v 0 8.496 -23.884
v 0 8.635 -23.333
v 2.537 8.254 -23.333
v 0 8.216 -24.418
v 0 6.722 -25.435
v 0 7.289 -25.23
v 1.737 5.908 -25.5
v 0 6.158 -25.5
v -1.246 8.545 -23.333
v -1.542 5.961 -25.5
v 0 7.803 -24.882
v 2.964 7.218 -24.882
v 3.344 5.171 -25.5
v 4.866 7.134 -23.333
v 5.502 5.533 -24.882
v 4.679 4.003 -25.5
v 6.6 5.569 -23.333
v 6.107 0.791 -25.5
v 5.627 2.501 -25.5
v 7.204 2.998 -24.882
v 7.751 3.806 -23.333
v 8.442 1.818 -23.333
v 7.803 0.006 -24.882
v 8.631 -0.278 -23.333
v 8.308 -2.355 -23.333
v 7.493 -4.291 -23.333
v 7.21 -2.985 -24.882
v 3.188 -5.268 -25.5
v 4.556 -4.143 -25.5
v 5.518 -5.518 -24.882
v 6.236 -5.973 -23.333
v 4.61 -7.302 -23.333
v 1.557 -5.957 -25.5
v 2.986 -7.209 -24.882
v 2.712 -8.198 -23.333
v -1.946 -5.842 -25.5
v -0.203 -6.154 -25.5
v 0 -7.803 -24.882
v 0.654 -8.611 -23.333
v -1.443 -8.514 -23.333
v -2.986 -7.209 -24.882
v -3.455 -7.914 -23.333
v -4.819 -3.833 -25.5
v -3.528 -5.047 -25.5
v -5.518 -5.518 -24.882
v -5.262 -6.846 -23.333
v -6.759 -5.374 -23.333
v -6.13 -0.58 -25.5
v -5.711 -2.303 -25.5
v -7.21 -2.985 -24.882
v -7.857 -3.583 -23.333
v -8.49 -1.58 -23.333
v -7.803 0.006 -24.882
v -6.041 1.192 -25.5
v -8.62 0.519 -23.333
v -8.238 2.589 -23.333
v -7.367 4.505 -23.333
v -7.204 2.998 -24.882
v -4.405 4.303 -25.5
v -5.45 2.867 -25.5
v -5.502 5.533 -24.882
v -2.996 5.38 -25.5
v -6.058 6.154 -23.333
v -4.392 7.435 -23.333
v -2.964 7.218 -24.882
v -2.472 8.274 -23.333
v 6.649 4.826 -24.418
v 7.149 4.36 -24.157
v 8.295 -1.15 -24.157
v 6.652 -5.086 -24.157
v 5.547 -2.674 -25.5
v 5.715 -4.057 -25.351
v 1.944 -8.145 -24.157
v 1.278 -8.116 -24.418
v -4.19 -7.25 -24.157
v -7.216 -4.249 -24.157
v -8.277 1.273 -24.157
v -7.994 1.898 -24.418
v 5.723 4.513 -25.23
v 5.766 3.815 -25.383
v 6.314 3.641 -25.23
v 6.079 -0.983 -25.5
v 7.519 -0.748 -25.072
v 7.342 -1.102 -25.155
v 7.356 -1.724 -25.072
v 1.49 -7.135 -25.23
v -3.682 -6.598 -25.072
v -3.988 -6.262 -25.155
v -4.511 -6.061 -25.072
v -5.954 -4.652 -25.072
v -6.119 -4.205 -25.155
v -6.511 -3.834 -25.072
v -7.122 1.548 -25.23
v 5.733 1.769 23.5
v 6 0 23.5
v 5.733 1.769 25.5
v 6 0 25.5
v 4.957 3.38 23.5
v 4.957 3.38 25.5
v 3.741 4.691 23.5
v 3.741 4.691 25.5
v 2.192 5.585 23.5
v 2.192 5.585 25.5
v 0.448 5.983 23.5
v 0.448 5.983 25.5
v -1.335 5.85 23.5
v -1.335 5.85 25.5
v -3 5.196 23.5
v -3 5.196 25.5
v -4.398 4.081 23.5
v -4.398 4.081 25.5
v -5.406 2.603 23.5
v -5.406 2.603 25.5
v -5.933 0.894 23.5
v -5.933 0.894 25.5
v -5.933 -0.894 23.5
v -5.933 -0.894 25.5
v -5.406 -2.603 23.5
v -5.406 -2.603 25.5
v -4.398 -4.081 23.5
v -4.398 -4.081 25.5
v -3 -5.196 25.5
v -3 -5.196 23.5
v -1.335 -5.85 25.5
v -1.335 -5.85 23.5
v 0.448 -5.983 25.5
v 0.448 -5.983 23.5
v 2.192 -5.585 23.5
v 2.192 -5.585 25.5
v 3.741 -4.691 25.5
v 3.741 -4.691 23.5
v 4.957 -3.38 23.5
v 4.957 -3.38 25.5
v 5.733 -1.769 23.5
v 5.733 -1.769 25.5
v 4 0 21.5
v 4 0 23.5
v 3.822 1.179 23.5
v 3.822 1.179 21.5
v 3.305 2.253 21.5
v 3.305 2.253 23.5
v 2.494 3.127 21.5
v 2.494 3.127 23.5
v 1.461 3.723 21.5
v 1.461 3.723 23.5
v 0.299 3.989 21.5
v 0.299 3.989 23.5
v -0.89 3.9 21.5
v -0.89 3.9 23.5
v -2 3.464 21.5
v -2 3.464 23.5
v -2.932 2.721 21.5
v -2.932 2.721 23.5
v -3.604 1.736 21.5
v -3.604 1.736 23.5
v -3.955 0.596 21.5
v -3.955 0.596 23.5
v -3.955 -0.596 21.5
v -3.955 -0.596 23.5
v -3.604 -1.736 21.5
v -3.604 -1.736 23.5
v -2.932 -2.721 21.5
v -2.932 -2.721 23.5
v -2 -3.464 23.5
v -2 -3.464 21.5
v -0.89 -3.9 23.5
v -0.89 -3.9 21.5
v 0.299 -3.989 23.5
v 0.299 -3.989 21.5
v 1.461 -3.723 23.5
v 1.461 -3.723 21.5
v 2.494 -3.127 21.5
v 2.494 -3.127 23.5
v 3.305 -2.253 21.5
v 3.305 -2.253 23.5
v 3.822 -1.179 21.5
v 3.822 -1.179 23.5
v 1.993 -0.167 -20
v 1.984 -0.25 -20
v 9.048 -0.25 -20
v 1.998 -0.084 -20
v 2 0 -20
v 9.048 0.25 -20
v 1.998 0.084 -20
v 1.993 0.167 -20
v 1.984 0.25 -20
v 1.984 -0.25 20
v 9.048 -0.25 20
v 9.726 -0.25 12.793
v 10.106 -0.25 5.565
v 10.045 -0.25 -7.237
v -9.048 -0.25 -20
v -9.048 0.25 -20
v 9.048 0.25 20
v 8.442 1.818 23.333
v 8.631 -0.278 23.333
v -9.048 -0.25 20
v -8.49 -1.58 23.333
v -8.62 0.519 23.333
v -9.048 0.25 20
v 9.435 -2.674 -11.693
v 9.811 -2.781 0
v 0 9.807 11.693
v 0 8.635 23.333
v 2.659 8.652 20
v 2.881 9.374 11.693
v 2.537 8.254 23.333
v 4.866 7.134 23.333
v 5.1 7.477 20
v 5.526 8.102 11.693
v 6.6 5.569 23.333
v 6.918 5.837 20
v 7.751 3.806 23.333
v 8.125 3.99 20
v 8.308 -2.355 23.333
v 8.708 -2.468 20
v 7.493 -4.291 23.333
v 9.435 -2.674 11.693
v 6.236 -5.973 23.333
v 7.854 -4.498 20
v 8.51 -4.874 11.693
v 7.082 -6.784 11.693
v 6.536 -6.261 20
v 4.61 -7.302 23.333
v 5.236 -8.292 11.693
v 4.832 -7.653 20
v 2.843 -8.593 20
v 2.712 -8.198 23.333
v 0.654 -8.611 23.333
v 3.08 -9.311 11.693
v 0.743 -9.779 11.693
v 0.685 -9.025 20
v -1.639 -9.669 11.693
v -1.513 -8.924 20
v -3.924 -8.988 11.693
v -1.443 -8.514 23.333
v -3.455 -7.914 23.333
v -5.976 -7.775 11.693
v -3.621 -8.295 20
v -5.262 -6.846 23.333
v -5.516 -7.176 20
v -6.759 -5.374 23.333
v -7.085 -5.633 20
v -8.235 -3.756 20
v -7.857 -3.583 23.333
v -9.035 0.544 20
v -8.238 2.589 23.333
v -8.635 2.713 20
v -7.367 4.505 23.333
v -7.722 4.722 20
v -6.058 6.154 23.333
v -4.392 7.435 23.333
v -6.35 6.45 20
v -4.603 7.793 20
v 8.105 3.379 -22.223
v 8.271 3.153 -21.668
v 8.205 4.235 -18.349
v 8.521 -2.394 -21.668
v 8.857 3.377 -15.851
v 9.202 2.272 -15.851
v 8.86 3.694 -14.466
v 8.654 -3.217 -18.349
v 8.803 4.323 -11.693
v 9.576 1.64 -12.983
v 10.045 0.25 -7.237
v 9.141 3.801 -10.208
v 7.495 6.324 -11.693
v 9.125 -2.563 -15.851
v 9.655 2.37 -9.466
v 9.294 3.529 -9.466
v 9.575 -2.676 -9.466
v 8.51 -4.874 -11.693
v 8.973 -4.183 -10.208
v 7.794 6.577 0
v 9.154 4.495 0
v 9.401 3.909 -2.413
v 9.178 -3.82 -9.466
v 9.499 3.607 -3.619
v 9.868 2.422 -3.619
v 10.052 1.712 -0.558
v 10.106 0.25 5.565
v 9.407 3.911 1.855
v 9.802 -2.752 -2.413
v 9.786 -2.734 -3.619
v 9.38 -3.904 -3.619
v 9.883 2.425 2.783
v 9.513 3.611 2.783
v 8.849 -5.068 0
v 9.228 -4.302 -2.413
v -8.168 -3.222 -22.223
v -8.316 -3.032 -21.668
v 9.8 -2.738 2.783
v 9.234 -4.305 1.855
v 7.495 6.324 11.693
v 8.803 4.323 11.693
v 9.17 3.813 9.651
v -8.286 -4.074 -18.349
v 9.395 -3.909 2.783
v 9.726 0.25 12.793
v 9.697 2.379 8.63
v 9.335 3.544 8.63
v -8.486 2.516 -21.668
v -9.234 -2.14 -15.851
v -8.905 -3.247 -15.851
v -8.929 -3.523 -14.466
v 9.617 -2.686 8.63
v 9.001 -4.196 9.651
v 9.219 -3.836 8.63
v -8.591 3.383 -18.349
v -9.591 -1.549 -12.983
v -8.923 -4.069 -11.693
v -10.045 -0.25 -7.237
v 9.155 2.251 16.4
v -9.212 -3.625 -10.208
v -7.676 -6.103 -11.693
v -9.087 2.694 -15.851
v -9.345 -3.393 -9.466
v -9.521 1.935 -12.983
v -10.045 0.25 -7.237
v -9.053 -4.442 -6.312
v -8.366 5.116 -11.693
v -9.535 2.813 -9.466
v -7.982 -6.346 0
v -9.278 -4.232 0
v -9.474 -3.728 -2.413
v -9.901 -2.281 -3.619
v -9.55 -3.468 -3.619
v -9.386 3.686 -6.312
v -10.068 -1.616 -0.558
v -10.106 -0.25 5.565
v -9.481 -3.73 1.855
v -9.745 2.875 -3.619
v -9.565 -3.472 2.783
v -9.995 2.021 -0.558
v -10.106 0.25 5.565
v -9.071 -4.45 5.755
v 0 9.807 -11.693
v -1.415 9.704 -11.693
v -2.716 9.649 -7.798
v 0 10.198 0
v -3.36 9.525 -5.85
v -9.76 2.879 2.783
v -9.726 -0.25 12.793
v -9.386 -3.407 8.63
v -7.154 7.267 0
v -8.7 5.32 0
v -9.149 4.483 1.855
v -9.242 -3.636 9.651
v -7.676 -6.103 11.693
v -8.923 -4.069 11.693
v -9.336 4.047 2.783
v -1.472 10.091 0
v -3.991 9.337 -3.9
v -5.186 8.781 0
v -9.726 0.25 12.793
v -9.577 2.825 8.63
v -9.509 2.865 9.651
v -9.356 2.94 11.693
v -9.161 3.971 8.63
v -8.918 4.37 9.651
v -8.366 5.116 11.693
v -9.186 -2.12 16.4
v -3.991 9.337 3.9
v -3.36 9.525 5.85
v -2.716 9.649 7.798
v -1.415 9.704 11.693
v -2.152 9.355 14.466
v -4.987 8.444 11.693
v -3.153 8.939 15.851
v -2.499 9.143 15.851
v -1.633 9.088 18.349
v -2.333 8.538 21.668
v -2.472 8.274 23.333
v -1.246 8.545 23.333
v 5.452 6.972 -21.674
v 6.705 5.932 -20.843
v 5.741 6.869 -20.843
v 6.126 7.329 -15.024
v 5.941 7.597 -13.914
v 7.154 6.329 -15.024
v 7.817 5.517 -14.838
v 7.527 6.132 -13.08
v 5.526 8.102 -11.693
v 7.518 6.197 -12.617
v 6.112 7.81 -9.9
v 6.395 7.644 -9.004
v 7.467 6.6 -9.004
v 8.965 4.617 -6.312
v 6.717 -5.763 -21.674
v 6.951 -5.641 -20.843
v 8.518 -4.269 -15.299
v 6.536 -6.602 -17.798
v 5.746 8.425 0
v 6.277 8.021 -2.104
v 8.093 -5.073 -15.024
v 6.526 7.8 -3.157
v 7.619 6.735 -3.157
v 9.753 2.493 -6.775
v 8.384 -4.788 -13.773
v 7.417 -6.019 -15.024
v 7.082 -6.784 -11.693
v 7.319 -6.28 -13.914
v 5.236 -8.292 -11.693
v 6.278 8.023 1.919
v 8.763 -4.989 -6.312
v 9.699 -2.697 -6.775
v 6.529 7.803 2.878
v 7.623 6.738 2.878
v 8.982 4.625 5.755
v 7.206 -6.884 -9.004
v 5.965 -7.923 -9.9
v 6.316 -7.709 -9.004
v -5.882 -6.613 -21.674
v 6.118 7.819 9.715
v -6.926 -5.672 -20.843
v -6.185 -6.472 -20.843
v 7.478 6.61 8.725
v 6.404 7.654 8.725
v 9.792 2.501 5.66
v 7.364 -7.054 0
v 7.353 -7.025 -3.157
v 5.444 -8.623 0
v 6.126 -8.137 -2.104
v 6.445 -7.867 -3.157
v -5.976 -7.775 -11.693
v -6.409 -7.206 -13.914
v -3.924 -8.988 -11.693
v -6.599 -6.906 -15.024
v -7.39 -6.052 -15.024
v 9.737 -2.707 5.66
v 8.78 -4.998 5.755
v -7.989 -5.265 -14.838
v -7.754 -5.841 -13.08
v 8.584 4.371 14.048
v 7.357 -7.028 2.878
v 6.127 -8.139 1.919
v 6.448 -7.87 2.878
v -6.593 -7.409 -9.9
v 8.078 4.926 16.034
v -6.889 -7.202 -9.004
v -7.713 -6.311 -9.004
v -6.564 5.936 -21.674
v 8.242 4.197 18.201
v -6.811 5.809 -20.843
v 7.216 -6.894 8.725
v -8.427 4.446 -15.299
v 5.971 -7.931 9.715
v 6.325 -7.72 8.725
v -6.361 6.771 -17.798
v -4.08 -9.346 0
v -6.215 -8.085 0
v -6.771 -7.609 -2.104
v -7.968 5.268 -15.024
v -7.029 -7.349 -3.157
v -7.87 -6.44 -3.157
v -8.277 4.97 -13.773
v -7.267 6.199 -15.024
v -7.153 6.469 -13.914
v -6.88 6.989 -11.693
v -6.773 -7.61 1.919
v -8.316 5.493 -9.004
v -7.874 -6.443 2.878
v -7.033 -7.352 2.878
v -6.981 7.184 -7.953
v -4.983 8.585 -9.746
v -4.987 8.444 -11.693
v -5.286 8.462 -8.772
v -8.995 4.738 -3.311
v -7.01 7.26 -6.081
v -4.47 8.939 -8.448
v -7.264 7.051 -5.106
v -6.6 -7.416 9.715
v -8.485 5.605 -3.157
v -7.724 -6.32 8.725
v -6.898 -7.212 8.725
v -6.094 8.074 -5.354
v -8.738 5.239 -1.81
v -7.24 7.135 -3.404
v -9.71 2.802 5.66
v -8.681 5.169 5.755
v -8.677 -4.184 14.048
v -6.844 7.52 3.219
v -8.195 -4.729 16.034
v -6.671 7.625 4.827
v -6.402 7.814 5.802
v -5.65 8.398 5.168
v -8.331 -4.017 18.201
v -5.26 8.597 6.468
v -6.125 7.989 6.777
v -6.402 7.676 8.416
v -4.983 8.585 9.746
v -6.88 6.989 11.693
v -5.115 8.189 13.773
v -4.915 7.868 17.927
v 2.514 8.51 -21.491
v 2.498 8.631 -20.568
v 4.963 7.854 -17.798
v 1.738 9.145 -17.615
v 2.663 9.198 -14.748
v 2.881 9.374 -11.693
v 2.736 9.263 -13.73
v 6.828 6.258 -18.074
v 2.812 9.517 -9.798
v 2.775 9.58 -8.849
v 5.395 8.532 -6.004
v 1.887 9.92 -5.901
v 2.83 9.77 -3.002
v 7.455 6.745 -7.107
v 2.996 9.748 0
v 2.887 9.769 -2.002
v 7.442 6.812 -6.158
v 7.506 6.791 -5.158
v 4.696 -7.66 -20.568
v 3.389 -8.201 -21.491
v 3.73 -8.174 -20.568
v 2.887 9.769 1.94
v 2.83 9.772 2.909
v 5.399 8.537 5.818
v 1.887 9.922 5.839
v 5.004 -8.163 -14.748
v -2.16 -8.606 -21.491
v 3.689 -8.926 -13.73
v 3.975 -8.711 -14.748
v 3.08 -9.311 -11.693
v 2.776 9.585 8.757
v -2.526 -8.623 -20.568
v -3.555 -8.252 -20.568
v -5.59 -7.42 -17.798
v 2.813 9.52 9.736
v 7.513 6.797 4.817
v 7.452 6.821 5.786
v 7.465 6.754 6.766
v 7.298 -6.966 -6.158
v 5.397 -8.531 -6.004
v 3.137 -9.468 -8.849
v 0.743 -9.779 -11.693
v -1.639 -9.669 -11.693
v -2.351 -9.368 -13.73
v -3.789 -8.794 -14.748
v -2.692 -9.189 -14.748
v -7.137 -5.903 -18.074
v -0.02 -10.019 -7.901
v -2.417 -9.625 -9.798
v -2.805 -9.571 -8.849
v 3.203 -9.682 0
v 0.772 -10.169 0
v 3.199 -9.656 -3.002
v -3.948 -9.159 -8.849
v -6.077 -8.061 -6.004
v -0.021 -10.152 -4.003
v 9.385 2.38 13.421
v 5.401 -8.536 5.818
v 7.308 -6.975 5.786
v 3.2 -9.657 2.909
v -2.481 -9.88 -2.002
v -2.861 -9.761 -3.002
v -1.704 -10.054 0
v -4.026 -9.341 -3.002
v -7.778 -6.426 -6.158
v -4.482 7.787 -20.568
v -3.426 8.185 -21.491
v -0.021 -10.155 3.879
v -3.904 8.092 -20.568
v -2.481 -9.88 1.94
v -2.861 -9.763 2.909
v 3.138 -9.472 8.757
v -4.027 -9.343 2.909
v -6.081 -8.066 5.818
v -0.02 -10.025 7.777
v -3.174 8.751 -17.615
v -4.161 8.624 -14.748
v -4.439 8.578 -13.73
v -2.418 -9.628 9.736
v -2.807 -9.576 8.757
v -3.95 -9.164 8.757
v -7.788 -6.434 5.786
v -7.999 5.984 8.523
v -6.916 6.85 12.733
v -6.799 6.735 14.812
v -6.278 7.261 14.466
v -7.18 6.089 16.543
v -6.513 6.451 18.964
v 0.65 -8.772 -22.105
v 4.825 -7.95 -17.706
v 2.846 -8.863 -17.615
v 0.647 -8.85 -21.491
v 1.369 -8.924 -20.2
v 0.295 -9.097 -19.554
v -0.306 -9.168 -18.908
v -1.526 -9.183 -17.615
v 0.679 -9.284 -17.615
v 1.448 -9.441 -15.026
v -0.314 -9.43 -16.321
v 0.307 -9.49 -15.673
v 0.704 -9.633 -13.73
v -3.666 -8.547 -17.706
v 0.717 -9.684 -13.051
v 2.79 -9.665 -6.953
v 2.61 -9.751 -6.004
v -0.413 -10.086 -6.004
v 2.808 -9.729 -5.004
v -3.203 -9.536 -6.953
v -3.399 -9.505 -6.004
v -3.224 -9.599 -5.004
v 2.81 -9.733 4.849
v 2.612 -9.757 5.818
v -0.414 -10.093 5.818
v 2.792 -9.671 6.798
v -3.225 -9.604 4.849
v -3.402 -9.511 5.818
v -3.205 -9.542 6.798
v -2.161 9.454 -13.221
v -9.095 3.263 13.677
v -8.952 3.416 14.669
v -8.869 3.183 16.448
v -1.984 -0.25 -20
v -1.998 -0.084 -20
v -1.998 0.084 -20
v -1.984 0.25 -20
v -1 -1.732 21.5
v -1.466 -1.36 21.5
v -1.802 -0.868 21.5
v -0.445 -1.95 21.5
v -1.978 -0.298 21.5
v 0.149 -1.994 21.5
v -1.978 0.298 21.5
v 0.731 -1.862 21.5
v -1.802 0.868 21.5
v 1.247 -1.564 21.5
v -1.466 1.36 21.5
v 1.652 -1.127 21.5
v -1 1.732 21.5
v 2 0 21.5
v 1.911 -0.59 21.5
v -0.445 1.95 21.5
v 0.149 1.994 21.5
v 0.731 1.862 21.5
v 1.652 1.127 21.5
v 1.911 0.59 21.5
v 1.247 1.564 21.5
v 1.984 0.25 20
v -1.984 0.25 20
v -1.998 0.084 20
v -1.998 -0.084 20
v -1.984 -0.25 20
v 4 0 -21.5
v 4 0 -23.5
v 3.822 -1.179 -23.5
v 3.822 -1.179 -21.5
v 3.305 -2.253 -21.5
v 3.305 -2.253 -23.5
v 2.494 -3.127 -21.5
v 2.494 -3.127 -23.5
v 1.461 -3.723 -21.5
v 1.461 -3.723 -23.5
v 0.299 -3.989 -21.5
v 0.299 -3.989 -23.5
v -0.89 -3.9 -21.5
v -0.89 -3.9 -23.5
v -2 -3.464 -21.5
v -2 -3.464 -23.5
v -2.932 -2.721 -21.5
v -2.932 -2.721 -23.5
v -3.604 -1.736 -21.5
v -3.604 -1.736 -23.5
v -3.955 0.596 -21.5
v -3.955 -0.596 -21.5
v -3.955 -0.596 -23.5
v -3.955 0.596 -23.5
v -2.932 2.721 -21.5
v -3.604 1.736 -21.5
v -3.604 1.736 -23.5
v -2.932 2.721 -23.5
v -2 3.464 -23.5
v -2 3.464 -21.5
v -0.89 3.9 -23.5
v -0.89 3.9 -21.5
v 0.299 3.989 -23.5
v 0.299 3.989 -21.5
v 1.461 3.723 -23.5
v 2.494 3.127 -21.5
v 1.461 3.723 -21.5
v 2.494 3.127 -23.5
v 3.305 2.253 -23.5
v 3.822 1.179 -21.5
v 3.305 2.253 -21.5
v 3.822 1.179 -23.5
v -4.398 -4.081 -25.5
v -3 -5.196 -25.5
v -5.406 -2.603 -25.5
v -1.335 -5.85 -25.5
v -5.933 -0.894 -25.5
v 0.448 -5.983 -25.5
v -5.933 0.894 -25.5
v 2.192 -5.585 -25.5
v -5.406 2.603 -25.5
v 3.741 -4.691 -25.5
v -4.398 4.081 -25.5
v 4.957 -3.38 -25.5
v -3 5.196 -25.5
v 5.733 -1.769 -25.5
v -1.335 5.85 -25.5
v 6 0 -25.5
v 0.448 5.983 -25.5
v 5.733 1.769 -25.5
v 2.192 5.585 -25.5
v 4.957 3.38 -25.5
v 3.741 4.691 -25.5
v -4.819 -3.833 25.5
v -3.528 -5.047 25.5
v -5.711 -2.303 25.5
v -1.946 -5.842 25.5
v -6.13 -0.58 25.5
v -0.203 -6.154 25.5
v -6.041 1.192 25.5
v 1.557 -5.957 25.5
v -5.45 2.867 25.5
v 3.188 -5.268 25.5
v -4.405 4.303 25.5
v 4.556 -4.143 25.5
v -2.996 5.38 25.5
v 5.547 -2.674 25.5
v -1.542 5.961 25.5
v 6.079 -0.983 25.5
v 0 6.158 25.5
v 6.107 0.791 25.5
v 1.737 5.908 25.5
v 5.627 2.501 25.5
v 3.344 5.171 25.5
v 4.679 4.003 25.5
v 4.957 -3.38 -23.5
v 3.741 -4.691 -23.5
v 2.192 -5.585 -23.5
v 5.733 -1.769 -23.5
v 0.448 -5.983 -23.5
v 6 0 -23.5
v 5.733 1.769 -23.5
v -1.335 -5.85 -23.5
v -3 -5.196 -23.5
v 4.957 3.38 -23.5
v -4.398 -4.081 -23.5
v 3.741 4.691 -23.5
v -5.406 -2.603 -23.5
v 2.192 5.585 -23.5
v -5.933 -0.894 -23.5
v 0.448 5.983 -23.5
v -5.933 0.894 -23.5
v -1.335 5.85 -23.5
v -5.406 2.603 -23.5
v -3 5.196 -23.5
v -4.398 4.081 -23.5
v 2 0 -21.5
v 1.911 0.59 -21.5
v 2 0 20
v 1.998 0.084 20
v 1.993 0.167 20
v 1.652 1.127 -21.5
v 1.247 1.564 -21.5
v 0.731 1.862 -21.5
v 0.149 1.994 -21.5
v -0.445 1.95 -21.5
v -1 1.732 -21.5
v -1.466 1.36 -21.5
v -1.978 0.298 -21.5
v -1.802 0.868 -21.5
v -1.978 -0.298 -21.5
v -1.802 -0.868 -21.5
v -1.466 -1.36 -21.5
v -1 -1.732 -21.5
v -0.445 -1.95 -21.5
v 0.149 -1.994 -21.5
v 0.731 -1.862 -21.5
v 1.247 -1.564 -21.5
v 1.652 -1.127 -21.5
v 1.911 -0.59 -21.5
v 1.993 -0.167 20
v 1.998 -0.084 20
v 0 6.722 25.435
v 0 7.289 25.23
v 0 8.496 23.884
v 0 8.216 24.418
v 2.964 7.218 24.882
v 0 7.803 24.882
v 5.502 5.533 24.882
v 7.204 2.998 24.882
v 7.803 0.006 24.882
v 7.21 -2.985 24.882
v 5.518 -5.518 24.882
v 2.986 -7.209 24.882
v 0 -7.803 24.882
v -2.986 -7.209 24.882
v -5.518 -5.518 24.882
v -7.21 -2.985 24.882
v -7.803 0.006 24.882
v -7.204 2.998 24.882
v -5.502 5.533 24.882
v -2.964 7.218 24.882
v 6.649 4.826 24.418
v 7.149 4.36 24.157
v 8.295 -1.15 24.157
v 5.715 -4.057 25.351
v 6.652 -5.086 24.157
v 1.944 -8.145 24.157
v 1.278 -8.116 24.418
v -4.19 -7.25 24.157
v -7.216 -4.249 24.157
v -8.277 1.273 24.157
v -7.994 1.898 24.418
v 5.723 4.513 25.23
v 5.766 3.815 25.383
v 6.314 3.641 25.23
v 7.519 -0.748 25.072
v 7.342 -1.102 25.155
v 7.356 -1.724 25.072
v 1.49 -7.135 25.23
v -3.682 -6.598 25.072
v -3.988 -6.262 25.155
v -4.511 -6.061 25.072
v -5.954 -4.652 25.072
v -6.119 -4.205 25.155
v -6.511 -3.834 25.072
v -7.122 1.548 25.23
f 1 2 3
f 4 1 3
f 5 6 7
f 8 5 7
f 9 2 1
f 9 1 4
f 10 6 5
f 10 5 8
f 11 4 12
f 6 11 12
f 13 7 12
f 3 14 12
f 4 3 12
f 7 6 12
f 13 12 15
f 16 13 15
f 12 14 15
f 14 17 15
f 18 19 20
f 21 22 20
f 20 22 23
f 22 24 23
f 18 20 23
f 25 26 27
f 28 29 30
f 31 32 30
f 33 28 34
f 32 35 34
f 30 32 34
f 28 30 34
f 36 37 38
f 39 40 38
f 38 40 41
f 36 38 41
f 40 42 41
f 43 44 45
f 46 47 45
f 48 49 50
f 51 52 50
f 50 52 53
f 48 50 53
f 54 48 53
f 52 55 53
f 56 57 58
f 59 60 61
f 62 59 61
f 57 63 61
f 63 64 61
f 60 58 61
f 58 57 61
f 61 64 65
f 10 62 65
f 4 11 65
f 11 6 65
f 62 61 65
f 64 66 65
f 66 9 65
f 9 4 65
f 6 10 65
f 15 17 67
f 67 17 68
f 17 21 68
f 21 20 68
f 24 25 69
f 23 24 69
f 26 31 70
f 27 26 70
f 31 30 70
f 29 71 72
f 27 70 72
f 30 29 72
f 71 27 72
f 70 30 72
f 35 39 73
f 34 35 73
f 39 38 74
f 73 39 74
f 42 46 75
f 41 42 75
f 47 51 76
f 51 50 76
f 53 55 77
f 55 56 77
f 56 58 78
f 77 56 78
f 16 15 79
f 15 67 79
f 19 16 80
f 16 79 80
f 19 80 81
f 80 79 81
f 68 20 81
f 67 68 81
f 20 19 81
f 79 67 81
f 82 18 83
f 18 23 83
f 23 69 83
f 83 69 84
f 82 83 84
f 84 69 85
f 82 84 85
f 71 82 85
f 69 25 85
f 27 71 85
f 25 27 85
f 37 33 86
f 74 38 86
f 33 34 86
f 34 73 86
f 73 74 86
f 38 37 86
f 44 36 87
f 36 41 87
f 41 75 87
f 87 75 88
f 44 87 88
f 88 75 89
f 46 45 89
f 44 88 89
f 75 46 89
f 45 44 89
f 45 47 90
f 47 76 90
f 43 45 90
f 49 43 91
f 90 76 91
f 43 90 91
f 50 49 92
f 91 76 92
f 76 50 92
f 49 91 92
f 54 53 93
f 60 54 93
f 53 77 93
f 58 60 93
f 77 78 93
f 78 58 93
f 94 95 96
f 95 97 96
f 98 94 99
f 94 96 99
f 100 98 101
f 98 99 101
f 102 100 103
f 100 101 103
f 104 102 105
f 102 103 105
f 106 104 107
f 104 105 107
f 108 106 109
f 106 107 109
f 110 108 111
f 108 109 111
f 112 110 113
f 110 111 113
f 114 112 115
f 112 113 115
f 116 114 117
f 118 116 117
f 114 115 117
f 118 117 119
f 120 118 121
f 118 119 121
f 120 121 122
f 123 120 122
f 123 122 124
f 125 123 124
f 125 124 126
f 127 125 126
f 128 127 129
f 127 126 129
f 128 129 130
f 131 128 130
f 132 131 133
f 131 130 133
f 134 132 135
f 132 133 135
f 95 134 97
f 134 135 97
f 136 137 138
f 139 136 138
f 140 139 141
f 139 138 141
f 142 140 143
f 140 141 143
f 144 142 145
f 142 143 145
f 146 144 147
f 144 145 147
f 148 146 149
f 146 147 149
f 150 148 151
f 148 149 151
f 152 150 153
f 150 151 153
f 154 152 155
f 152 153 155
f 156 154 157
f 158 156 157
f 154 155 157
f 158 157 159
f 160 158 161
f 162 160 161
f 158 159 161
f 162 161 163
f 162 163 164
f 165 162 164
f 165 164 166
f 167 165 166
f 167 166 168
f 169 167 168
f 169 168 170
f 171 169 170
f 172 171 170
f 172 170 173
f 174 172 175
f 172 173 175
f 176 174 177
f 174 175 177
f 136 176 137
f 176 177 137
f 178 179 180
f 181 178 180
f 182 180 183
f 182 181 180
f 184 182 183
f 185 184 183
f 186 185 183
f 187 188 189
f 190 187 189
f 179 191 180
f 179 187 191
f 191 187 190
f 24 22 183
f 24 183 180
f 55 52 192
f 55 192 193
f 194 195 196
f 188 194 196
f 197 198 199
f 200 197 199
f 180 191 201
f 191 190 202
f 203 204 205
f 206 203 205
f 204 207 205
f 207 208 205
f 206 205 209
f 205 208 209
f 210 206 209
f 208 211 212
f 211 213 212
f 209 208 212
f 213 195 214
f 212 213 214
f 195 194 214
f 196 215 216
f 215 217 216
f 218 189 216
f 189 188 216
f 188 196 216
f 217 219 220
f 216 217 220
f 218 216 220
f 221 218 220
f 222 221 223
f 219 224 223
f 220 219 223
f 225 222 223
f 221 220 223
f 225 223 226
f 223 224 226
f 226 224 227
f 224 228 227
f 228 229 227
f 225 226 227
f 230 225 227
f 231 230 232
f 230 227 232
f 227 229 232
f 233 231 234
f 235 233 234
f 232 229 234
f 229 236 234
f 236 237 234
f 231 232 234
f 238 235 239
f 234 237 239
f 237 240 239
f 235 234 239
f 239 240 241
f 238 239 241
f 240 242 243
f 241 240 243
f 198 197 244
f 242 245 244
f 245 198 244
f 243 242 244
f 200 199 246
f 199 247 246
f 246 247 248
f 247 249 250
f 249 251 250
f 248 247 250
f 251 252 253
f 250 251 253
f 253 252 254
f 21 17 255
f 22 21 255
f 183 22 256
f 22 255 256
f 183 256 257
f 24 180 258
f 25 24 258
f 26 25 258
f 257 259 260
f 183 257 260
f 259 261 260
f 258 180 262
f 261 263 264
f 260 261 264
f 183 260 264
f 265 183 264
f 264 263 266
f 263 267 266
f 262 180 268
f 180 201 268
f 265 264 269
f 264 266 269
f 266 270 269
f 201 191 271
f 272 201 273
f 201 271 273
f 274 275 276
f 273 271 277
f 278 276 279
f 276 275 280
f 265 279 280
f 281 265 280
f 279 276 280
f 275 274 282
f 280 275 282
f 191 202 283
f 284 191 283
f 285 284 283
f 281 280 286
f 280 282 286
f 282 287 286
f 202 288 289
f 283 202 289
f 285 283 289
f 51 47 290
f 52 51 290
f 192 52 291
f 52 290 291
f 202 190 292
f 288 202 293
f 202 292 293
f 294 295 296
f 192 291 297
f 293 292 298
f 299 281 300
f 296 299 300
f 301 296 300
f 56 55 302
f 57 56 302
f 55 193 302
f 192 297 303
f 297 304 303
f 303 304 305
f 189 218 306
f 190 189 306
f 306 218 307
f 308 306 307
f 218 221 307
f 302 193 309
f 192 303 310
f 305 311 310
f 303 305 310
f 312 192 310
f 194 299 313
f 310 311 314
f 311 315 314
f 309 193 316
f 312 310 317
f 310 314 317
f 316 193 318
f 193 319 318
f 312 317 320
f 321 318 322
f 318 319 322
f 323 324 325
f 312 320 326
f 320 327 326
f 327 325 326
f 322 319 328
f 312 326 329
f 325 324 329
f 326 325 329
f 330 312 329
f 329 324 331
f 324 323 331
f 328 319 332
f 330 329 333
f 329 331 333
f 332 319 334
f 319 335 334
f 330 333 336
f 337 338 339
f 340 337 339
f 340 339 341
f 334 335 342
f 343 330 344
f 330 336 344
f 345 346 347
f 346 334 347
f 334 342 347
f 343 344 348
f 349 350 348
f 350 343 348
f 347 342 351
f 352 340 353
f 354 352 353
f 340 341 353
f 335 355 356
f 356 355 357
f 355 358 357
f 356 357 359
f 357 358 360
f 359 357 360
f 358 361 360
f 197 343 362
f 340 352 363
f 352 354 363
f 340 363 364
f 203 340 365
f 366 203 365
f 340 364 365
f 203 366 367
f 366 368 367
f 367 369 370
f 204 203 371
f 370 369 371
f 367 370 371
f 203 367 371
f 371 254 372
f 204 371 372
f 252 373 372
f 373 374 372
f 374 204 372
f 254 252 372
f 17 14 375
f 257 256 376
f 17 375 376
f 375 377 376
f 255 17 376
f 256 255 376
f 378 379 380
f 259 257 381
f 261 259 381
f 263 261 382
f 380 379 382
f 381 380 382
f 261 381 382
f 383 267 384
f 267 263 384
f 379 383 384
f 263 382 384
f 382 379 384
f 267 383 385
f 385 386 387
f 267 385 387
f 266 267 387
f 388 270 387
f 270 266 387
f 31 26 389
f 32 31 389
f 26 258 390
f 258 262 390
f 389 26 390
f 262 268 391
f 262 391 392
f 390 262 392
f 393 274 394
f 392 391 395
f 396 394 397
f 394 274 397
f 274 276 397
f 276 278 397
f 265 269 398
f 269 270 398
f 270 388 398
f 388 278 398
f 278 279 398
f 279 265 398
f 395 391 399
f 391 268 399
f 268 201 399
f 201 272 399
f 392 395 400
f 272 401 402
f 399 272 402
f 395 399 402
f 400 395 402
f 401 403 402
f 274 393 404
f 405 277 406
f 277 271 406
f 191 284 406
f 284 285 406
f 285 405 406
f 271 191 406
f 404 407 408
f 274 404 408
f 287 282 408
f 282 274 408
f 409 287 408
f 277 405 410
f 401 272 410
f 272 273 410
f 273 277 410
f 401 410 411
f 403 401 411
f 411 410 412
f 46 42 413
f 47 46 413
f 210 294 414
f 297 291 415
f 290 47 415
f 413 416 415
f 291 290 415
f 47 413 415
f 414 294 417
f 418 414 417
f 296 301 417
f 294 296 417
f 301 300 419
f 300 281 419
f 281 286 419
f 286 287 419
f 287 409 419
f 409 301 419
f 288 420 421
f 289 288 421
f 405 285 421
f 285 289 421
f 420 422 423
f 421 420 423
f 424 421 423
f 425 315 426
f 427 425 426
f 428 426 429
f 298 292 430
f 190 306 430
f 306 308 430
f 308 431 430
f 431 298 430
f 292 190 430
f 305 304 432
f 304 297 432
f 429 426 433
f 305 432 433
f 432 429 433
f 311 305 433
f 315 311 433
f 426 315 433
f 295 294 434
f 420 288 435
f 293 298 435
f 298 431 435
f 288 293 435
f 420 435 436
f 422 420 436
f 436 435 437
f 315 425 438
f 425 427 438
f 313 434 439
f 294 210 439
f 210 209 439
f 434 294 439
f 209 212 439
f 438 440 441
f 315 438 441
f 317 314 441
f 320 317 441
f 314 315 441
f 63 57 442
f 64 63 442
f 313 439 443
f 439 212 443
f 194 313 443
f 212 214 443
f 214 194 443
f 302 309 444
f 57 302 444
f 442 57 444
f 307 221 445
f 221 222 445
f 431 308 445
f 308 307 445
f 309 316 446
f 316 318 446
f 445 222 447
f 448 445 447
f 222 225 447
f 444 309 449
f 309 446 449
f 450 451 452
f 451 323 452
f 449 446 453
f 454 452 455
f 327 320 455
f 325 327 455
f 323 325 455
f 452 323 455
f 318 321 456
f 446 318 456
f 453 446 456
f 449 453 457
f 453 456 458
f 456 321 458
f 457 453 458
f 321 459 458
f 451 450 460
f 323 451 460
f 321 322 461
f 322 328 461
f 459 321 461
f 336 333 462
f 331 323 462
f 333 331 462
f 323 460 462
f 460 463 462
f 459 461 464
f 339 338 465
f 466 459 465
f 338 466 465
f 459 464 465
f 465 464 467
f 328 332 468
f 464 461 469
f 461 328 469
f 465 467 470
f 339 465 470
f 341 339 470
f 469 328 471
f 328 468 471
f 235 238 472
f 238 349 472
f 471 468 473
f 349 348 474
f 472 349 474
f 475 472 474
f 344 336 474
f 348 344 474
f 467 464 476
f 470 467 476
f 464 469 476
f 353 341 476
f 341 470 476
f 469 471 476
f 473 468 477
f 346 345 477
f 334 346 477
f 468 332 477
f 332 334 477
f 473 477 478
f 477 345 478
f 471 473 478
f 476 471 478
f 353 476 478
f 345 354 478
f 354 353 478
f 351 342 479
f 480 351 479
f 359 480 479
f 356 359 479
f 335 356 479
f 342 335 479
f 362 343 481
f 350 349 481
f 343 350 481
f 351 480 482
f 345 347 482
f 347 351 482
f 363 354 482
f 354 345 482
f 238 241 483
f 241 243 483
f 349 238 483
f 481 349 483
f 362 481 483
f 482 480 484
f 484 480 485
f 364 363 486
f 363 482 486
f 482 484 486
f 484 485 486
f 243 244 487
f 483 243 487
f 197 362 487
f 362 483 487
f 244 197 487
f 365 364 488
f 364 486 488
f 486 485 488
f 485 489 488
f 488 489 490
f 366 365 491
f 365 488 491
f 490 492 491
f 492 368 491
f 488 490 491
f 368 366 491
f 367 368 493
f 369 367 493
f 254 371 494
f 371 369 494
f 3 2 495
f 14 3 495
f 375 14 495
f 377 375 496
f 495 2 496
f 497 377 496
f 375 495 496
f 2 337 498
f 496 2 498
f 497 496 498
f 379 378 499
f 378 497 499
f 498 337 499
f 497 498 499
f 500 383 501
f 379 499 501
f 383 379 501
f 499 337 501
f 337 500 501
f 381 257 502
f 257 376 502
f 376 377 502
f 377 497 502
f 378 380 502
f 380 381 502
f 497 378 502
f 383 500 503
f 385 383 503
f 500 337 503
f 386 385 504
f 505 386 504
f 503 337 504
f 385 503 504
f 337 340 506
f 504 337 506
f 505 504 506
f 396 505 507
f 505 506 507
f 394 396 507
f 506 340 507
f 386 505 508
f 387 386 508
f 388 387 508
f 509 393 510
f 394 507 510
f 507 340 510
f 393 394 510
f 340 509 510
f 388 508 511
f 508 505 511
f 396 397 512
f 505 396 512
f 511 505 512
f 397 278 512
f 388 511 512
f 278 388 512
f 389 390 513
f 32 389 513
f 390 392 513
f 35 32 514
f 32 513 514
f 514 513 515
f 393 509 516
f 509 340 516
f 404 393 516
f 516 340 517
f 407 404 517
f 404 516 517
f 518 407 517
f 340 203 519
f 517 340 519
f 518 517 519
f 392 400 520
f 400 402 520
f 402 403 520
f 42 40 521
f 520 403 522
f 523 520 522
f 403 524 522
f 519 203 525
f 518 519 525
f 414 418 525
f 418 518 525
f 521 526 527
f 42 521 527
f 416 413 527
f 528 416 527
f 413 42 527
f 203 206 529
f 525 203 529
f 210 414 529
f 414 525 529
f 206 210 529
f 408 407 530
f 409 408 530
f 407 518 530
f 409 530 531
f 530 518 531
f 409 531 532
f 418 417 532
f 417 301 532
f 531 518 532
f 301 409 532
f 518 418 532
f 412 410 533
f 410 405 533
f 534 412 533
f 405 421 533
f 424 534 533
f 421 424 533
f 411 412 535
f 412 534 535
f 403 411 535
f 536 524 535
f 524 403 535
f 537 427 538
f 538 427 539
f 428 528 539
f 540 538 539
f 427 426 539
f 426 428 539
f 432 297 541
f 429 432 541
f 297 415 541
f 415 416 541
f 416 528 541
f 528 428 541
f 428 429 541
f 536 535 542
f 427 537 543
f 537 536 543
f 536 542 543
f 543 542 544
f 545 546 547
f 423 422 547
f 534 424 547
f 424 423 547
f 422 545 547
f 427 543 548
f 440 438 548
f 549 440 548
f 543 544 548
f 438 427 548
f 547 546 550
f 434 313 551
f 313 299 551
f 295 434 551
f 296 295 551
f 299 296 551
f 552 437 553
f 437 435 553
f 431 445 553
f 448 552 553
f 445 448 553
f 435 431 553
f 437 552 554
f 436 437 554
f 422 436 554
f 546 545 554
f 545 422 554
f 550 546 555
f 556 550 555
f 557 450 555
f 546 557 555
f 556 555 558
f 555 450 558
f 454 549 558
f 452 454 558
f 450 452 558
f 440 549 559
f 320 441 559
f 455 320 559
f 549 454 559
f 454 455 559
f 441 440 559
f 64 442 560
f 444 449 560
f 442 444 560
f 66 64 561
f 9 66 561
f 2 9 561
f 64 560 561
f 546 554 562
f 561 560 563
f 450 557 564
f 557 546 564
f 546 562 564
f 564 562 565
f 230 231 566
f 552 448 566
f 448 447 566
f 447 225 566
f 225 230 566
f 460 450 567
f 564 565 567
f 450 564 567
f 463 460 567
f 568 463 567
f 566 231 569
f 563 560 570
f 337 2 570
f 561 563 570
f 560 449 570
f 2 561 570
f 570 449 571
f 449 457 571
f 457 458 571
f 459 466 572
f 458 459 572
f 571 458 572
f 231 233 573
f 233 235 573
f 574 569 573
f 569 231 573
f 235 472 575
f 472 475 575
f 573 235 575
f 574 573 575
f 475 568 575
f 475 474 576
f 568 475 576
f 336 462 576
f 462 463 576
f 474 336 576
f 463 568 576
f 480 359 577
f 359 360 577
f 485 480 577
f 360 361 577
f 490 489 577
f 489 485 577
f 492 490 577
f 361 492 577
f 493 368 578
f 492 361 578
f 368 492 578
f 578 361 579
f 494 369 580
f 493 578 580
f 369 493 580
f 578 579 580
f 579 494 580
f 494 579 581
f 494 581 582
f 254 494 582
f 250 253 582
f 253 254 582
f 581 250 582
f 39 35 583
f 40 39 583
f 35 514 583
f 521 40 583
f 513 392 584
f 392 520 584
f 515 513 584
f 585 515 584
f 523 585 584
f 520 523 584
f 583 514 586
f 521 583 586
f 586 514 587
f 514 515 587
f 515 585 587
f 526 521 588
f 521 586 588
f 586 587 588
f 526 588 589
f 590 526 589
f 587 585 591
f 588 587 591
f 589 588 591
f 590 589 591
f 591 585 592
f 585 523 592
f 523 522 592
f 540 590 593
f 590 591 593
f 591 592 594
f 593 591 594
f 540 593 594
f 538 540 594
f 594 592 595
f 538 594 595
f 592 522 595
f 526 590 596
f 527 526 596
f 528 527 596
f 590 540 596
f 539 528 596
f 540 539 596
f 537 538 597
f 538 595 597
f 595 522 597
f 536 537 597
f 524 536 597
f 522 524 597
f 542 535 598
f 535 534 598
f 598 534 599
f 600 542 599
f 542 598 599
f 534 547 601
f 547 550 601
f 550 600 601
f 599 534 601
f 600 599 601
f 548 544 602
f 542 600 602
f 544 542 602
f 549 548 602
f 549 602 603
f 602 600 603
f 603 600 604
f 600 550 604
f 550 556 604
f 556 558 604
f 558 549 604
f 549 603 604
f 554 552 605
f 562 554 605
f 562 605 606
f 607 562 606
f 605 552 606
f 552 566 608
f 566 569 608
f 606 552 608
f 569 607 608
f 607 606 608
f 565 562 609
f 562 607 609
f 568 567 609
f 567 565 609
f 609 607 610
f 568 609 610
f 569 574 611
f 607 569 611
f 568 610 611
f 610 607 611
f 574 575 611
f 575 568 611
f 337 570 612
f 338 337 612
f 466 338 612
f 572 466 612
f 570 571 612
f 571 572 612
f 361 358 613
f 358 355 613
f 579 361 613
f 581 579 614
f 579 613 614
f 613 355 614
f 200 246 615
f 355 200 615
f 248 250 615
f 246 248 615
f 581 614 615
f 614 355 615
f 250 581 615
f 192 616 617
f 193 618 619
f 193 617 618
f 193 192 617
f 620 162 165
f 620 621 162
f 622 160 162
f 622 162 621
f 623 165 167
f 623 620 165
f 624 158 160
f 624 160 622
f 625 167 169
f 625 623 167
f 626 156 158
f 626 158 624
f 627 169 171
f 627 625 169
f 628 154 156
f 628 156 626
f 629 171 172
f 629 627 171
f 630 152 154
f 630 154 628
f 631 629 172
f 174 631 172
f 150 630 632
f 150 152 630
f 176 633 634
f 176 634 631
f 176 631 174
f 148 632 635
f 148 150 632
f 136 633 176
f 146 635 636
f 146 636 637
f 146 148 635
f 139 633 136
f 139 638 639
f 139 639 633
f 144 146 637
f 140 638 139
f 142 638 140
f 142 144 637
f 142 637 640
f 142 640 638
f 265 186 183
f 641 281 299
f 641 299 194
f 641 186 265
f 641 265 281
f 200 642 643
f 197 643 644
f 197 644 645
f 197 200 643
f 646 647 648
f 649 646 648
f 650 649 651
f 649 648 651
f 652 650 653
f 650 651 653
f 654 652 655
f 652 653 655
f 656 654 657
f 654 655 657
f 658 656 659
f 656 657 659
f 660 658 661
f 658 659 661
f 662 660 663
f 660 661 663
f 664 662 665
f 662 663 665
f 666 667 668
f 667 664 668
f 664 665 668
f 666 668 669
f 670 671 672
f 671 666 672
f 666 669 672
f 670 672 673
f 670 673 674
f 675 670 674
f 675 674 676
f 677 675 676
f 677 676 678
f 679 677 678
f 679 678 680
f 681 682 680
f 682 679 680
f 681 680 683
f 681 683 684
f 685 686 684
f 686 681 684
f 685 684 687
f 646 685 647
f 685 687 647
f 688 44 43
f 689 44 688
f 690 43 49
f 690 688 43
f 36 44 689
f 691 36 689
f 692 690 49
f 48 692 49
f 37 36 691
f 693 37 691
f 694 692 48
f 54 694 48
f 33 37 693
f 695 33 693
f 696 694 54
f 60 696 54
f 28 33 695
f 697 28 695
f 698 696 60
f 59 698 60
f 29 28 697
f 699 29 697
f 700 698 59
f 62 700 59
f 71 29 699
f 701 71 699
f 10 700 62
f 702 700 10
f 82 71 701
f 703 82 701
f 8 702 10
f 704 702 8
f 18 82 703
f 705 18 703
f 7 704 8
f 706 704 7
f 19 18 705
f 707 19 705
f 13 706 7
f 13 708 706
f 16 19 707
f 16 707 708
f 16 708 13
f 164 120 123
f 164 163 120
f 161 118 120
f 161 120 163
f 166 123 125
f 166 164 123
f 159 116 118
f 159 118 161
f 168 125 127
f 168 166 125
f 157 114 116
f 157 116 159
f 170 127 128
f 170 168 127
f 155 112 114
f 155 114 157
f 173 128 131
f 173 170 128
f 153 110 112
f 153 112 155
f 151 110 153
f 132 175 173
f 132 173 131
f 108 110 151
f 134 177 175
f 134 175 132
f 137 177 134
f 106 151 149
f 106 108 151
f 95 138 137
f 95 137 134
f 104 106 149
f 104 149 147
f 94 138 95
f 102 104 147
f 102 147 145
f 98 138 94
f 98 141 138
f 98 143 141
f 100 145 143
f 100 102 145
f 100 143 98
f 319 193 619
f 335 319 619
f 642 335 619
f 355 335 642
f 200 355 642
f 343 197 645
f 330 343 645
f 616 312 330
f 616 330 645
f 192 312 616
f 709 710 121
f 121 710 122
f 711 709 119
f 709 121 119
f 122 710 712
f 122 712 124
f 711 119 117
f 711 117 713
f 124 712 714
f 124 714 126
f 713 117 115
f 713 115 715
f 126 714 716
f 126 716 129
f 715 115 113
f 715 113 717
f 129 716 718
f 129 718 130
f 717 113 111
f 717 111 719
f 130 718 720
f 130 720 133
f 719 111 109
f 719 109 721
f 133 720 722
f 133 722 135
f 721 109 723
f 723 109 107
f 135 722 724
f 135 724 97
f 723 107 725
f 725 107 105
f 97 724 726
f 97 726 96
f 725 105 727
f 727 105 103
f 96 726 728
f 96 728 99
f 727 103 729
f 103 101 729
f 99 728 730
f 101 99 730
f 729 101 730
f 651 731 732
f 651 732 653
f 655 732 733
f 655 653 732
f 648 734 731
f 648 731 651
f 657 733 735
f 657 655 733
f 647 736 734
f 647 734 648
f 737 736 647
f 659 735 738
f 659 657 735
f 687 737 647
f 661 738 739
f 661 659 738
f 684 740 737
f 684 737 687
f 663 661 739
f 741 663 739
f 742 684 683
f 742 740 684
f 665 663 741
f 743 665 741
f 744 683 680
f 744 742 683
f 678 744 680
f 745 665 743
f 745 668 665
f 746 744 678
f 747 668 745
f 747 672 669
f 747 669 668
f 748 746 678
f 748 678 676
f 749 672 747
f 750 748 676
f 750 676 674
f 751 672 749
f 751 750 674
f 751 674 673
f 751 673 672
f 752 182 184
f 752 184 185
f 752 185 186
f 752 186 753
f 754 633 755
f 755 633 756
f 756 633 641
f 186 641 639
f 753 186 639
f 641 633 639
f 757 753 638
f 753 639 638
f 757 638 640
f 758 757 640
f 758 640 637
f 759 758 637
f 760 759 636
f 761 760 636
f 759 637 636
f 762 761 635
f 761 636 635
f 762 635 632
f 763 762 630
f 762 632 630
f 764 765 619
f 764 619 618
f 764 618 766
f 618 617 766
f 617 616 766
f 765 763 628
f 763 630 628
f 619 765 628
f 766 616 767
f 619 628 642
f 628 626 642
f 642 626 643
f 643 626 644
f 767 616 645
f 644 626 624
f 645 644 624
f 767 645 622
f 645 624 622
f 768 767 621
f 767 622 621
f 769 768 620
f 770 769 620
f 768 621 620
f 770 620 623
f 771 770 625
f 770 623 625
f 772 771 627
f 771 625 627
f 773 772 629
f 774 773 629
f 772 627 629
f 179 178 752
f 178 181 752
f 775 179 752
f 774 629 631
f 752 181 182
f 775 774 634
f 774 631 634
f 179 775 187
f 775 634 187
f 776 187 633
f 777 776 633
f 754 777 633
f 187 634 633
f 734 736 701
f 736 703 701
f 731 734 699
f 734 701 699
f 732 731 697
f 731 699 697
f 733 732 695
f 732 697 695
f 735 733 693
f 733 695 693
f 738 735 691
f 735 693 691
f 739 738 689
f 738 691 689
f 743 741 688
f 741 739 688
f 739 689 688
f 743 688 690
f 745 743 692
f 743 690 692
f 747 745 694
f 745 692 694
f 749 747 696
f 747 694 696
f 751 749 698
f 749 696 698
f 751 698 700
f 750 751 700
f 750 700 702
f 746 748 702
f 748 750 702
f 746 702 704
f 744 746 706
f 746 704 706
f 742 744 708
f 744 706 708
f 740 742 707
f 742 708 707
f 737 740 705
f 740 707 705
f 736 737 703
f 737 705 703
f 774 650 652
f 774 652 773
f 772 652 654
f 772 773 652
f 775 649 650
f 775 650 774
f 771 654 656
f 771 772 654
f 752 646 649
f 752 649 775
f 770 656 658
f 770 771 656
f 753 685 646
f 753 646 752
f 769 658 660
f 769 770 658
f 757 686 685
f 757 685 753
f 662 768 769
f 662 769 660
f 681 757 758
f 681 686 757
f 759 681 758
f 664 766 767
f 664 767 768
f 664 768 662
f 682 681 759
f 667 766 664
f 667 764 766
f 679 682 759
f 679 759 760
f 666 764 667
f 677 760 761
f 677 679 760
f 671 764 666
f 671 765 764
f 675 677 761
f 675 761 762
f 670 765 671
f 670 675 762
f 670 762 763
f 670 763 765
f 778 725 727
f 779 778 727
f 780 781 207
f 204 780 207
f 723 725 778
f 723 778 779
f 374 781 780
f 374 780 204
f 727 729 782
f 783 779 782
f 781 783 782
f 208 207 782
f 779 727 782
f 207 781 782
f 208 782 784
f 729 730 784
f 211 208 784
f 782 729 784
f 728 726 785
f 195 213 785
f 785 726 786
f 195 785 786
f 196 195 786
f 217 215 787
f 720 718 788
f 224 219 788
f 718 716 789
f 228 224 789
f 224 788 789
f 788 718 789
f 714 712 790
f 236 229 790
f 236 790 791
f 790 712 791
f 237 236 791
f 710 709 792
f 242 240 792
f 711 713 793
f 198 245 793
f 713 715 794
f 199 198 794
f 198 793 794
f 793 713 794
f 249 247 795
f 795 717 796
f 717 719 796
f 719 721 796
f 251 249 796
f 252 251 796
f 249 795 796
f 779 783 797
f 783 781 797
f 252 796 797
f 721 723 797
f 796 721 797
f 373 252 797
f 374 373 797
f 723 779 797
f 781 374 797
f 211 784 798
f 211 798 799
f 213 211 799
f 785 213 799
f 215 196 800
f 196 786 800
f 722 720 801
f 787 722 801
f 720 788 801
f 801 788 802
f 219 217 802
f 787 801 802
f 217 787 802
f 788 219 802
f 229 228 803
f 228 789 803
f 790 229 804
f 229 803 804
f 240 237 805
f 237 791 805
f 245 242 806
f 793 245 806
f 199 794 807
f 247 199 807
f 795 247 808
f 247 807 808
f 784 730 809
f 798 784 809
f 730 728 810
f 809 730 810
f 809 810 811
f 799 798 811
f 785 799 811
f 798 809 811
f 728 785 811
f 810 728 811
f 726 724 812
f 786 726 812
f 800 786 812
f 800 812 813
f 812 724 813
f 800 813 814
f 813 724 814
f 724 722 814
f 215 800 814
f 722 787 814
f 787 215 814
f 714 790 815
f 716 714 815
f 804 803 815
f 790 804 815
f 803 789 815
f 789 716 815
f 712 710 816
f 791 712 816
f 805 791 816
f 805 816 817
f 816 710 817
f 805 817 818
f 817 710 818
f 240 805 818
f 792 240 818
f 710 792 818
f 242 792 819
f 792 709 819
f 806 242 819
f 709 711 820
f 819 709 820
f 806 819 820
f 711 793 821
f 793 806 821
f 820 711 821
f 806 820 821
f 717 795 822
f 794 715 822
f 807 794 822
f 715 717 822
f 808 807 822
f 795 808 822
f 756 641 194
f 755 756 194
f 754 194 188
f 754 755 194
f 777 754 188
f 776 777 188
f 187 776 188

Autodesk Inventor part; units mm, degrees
ref_plane "YZ Plane" through (0, 0, 0) normal (1, 0, 0) x (0, 1, 0)
ref_plane "XZ Plane" through (0, 0, 0) normal (0, 1, 0) x (-1, 0, 0)
ref_plane "XY Plane" through (0, 0, 0) normal (0, 0, 1) x (1, 0, 0)
sketch "Sketch1" plane through (0, 0, 0) normal (1, 0, 0) x (0, 1, 0)
  line L0 (0, 25.5) -> (0, -25.5)
  line L1 (0, 25.5) -> (8.33, 25.5)
  line L2 (0, -25.5) -> (8.33, -25.5)
  arc A0 (8.33, -25.5) -> (8.33, 25.5) centre (-164.8022, 0) ccw
  point P0 (0, 0)
  dimension "d0" = 51
  dimension "d1" = 8.33
  dimension "d2" = 8.33
  dimension "d3" = 175
revolve "Revolution1" add sketch "Sketch1" angle 360 about axis through (0, 0, 25.5) along (0, 0, -1)
sketch "Sketch2" plane through (0, 0, 25.5) normal (0, 0, 1) x (1, 0, 0)
  circle A0 centre (0, 0) radius 6
  dimension "d5" = 12
extrude "Extrusion1" cut sketch "Sketch2" against normal blind 2
sketch "Sketch3" plane through (0, 0, 23.5) normal (0, 0, 1) x (1, 0, 0)
  circle A0 centre (0, 0) radius 4
  dimension "d8" = 8
extrude "Extrusion2" cut sketch "Sketch3" against normal blind 2
fillet "Fillet1" radius 2.5 1 edges at (0, -8.33, 25.5)
mirror "Mirror1" about plane through (0, 0, 0) normal (0, 0, 1) of "Extrusion1", "Extrusion2", "Fillet1"
sketch "Sketch4" plane through (0, 0, 0) normal (0, 0, 1) x (1, 0, 0)
  circle A0 centre (0, 0) radius 4 projected
  circle A1 centre (0, 0) radius 2
  point P0 (0, 0)
  dimension "d12" = 4
extrude "Extrusion3" cut sketch "Sketch4" along normal mid plane 805.5 contours A1
sketch "Sketch5" plane through (0, 0, 0) normal (1, 0, 0) x (0, 1, 0)
  line L0 (-0.25, -20) -> (0.25, -20)
  line L1 (0.25, -20) -> (0.25, 20)
  line L2 (0.25, 20) -> (-0.25, 20)
  line L3 (-0.25, 20) -> (-0.25, -20)
  line L4 (-0.25, -20) -> (0.25, 20) construction
  line L5 (0.25, -20) -> (-0.25, 20) construction
  point P0 (0, 0)
  dimension "d17" = 0.5
  dimension "d18" = 40
extrude "Extrusion4" cut sketch "Sketch5" along normal mid plane 40
properties part number "roller" material "Rubber"
